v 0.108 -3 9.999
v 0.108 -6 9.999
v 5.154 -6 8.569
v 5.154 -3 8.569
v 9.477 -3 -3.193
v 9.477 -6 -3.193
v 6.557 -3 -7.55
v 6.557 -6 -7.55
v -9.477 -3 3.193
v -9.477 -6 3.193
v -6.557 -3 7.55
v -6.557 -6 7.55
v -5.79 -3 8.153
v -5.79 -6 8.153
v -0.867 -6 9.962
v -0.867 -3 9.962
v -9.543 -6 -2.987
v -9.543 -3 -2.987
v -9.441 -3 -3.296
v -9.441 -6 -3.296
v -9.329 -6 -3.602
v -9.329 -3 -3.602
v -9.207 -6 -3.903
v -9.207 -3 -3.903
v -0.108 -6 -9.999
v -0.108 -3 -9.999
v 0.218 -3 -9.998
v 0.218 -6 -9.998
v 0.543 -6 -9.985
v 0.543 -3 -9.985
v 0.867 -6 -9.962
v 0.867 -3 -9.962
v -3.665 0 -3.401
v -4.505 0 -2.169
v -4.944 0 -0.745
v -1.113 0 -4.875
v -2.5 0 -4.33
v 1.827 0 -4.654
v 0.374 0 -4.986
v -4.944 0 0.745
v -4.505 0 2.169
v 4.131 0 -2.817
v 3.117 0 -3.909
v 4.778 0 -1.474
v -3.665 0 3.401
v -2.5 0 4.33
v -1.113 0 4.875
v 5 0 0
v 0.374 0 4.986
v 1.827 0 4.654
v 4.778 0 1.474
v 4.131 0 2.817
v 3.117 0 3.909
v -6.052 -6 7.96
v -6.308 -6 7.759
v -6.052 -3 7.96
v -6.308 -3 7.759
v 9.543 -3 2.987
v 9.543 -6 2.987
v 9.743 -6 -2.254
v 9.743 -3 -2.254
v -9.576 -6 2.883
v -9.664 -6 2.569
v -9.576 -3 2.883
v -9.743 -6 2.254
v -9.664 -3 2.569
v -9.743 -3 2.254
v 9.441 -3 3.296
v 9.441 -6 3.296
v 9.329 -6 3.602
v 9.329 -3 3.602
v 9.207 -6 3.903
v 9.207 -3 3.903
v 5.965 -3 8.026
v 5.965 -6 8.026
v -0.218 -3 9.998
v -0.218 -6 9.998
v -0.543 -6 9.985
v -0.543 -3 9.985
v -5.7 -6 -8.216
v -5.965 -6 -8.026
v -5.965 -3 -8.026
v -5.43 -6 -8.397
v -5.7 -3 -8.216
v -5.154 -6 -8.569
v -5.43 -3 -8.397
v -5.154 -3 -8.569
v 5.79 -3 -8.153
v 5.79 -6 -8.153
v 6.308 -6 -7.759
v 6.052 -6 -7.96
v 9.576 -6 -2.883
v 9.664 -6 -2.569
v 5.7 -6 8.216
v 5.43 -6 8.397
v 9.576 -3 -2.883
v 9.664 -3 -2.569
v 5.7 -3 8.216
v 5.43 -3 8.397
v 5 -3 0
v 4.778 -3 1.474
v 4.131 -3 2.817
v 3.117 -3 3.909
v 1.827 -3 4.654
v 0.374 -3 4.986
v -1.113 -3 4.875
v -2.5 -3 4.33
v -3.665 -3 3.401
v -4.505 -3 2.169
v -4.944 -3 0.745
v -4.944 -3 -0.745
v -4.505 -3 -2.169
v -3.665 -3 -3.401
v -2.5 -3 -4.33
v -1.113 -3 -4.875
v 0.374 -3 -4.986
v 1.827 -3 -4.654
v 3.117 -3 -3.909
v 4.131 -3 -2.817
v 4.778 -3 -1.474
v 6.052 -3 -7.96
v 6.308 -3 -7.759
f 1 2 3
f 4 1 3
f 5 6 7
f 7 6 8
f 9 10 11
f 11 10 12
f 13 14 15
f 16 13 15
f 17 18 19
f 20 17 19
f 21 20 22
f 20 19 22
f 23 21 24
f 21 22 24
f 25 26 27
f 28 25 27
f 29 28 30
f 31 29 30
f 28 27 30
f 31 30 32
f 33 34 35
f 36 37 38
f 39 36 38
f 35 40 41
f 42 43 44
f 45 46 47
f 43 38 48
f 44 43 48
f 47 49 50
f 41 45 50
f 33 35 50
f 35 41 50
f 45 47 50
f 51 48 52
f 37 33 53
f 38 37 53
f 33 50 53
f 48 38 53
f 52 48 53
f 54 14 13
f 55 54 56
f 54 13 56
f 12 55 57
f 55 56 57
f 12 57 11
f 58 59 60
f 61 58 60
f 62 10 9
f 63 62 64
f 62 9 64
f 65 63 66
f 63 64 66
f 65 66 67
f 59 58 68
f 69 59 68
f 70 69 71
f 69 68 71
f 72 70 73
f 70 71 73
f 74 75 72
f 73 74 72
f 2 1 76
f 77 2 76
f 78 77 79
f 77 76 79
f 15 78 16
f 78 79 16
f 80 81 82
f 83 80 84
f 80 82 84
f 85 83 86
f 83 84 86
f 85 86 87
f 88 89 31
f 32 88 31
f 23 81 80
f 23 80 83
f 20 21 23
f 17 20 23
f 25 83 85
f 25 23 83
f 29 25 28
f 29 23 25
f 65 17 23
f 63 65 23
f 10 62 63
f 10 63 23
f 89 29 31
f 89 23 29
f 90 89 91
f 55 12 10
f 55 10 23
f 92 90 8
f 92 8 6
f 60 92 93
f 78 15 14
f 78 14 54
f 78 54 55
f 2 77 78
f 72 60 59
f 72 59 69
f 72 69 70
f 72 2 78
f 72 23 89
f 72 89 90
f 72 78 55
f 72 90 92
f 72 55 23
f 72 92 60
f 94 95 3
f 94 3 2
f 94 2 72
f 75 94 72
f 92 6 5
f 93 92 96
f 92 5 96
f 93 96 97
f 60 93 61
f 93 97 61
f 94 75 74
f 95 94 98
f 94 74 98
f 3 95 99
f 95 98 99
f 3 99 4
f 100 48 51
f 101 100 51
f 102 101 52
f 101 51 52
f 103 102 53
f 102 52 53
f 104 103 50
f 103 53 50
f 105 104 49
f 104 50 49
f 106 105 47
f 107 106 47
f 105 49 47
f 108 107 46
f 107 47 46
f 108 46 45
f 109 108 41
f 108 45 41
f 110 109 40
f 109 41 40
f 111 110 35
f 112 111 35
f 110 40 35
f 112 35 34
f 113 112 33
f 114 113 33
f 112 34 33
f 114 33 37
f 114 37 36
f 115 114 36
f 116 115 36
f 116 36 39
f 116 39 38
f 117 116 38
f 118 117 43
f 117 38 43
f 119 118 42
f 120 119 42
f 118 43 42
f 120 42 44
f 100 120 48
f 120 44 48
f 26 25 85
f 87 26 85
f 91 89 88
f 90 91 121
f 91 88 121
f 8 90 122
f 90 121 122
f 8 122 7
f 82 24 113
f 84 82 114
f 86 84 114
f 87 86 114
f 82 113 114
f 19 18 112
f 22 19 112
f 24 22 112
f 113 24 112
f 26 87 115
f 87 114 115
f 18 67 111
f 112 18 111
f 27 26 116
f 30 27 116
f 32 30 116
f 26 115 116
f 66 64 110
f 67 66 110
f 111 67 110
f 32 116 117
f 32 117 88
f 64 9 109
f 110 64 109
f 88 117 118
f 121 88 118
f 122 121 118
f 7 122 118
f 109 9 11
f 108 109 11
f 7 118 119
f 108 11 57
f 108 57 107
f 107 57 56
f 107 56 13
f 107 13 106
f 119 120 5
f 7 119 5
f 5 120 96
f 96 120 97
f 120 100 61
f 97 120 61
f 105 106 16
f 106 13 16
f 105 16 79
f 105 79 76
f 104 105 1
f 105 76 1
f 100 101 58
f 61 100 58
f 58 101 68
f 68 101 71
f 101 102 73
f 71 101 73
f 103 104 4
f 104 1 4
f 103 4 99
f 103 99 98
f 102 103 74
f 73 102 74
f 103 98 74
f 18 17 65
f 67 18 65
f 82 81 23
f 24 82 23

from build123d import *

# Parameters (mm, degrees)
F0_R     = 5
F1_DEPTH = 3
F2_R     = 10
F3_DEPTH = 3
F4_R     = 11.267003
F5_DEPTH = 25


with BuildPart() as f1:
    # F0 (on Front) → F1 (new body)
    with BuildSketch(Plane.XZ):
        Circle(F0_R)
    extrude(amount=F1_DEPTH)

    # F2 (on face) → F3 (join)
    with BuildSketch(Plane.XZ.offset(3)):
        Circle(F2_R)
    extrude(amount=F3_DEPTH)

    # F4 (on face) → F5 (cut)
    with BuildSketch(Plane.XZ.offset(6)):
        Circle(F4_R)
        Polygon((-6.271795, 7.976108), (-0.38575, 10.139275), (5.647638, 8.429584), (9.52382, 3.500078), (9.762227, -2.766338), (6.271795, -7.976108), (0.38575, -10.139275), (-5.647638, -8.429584), (-9.52382, -3.500078), (-9.762227, 2.766338), align=None, mode=Mode.SUBTRACT)
    extrude(amount=-F5_DEPTH, mode=Mode.SUBTRACT)


solid = f1.part
